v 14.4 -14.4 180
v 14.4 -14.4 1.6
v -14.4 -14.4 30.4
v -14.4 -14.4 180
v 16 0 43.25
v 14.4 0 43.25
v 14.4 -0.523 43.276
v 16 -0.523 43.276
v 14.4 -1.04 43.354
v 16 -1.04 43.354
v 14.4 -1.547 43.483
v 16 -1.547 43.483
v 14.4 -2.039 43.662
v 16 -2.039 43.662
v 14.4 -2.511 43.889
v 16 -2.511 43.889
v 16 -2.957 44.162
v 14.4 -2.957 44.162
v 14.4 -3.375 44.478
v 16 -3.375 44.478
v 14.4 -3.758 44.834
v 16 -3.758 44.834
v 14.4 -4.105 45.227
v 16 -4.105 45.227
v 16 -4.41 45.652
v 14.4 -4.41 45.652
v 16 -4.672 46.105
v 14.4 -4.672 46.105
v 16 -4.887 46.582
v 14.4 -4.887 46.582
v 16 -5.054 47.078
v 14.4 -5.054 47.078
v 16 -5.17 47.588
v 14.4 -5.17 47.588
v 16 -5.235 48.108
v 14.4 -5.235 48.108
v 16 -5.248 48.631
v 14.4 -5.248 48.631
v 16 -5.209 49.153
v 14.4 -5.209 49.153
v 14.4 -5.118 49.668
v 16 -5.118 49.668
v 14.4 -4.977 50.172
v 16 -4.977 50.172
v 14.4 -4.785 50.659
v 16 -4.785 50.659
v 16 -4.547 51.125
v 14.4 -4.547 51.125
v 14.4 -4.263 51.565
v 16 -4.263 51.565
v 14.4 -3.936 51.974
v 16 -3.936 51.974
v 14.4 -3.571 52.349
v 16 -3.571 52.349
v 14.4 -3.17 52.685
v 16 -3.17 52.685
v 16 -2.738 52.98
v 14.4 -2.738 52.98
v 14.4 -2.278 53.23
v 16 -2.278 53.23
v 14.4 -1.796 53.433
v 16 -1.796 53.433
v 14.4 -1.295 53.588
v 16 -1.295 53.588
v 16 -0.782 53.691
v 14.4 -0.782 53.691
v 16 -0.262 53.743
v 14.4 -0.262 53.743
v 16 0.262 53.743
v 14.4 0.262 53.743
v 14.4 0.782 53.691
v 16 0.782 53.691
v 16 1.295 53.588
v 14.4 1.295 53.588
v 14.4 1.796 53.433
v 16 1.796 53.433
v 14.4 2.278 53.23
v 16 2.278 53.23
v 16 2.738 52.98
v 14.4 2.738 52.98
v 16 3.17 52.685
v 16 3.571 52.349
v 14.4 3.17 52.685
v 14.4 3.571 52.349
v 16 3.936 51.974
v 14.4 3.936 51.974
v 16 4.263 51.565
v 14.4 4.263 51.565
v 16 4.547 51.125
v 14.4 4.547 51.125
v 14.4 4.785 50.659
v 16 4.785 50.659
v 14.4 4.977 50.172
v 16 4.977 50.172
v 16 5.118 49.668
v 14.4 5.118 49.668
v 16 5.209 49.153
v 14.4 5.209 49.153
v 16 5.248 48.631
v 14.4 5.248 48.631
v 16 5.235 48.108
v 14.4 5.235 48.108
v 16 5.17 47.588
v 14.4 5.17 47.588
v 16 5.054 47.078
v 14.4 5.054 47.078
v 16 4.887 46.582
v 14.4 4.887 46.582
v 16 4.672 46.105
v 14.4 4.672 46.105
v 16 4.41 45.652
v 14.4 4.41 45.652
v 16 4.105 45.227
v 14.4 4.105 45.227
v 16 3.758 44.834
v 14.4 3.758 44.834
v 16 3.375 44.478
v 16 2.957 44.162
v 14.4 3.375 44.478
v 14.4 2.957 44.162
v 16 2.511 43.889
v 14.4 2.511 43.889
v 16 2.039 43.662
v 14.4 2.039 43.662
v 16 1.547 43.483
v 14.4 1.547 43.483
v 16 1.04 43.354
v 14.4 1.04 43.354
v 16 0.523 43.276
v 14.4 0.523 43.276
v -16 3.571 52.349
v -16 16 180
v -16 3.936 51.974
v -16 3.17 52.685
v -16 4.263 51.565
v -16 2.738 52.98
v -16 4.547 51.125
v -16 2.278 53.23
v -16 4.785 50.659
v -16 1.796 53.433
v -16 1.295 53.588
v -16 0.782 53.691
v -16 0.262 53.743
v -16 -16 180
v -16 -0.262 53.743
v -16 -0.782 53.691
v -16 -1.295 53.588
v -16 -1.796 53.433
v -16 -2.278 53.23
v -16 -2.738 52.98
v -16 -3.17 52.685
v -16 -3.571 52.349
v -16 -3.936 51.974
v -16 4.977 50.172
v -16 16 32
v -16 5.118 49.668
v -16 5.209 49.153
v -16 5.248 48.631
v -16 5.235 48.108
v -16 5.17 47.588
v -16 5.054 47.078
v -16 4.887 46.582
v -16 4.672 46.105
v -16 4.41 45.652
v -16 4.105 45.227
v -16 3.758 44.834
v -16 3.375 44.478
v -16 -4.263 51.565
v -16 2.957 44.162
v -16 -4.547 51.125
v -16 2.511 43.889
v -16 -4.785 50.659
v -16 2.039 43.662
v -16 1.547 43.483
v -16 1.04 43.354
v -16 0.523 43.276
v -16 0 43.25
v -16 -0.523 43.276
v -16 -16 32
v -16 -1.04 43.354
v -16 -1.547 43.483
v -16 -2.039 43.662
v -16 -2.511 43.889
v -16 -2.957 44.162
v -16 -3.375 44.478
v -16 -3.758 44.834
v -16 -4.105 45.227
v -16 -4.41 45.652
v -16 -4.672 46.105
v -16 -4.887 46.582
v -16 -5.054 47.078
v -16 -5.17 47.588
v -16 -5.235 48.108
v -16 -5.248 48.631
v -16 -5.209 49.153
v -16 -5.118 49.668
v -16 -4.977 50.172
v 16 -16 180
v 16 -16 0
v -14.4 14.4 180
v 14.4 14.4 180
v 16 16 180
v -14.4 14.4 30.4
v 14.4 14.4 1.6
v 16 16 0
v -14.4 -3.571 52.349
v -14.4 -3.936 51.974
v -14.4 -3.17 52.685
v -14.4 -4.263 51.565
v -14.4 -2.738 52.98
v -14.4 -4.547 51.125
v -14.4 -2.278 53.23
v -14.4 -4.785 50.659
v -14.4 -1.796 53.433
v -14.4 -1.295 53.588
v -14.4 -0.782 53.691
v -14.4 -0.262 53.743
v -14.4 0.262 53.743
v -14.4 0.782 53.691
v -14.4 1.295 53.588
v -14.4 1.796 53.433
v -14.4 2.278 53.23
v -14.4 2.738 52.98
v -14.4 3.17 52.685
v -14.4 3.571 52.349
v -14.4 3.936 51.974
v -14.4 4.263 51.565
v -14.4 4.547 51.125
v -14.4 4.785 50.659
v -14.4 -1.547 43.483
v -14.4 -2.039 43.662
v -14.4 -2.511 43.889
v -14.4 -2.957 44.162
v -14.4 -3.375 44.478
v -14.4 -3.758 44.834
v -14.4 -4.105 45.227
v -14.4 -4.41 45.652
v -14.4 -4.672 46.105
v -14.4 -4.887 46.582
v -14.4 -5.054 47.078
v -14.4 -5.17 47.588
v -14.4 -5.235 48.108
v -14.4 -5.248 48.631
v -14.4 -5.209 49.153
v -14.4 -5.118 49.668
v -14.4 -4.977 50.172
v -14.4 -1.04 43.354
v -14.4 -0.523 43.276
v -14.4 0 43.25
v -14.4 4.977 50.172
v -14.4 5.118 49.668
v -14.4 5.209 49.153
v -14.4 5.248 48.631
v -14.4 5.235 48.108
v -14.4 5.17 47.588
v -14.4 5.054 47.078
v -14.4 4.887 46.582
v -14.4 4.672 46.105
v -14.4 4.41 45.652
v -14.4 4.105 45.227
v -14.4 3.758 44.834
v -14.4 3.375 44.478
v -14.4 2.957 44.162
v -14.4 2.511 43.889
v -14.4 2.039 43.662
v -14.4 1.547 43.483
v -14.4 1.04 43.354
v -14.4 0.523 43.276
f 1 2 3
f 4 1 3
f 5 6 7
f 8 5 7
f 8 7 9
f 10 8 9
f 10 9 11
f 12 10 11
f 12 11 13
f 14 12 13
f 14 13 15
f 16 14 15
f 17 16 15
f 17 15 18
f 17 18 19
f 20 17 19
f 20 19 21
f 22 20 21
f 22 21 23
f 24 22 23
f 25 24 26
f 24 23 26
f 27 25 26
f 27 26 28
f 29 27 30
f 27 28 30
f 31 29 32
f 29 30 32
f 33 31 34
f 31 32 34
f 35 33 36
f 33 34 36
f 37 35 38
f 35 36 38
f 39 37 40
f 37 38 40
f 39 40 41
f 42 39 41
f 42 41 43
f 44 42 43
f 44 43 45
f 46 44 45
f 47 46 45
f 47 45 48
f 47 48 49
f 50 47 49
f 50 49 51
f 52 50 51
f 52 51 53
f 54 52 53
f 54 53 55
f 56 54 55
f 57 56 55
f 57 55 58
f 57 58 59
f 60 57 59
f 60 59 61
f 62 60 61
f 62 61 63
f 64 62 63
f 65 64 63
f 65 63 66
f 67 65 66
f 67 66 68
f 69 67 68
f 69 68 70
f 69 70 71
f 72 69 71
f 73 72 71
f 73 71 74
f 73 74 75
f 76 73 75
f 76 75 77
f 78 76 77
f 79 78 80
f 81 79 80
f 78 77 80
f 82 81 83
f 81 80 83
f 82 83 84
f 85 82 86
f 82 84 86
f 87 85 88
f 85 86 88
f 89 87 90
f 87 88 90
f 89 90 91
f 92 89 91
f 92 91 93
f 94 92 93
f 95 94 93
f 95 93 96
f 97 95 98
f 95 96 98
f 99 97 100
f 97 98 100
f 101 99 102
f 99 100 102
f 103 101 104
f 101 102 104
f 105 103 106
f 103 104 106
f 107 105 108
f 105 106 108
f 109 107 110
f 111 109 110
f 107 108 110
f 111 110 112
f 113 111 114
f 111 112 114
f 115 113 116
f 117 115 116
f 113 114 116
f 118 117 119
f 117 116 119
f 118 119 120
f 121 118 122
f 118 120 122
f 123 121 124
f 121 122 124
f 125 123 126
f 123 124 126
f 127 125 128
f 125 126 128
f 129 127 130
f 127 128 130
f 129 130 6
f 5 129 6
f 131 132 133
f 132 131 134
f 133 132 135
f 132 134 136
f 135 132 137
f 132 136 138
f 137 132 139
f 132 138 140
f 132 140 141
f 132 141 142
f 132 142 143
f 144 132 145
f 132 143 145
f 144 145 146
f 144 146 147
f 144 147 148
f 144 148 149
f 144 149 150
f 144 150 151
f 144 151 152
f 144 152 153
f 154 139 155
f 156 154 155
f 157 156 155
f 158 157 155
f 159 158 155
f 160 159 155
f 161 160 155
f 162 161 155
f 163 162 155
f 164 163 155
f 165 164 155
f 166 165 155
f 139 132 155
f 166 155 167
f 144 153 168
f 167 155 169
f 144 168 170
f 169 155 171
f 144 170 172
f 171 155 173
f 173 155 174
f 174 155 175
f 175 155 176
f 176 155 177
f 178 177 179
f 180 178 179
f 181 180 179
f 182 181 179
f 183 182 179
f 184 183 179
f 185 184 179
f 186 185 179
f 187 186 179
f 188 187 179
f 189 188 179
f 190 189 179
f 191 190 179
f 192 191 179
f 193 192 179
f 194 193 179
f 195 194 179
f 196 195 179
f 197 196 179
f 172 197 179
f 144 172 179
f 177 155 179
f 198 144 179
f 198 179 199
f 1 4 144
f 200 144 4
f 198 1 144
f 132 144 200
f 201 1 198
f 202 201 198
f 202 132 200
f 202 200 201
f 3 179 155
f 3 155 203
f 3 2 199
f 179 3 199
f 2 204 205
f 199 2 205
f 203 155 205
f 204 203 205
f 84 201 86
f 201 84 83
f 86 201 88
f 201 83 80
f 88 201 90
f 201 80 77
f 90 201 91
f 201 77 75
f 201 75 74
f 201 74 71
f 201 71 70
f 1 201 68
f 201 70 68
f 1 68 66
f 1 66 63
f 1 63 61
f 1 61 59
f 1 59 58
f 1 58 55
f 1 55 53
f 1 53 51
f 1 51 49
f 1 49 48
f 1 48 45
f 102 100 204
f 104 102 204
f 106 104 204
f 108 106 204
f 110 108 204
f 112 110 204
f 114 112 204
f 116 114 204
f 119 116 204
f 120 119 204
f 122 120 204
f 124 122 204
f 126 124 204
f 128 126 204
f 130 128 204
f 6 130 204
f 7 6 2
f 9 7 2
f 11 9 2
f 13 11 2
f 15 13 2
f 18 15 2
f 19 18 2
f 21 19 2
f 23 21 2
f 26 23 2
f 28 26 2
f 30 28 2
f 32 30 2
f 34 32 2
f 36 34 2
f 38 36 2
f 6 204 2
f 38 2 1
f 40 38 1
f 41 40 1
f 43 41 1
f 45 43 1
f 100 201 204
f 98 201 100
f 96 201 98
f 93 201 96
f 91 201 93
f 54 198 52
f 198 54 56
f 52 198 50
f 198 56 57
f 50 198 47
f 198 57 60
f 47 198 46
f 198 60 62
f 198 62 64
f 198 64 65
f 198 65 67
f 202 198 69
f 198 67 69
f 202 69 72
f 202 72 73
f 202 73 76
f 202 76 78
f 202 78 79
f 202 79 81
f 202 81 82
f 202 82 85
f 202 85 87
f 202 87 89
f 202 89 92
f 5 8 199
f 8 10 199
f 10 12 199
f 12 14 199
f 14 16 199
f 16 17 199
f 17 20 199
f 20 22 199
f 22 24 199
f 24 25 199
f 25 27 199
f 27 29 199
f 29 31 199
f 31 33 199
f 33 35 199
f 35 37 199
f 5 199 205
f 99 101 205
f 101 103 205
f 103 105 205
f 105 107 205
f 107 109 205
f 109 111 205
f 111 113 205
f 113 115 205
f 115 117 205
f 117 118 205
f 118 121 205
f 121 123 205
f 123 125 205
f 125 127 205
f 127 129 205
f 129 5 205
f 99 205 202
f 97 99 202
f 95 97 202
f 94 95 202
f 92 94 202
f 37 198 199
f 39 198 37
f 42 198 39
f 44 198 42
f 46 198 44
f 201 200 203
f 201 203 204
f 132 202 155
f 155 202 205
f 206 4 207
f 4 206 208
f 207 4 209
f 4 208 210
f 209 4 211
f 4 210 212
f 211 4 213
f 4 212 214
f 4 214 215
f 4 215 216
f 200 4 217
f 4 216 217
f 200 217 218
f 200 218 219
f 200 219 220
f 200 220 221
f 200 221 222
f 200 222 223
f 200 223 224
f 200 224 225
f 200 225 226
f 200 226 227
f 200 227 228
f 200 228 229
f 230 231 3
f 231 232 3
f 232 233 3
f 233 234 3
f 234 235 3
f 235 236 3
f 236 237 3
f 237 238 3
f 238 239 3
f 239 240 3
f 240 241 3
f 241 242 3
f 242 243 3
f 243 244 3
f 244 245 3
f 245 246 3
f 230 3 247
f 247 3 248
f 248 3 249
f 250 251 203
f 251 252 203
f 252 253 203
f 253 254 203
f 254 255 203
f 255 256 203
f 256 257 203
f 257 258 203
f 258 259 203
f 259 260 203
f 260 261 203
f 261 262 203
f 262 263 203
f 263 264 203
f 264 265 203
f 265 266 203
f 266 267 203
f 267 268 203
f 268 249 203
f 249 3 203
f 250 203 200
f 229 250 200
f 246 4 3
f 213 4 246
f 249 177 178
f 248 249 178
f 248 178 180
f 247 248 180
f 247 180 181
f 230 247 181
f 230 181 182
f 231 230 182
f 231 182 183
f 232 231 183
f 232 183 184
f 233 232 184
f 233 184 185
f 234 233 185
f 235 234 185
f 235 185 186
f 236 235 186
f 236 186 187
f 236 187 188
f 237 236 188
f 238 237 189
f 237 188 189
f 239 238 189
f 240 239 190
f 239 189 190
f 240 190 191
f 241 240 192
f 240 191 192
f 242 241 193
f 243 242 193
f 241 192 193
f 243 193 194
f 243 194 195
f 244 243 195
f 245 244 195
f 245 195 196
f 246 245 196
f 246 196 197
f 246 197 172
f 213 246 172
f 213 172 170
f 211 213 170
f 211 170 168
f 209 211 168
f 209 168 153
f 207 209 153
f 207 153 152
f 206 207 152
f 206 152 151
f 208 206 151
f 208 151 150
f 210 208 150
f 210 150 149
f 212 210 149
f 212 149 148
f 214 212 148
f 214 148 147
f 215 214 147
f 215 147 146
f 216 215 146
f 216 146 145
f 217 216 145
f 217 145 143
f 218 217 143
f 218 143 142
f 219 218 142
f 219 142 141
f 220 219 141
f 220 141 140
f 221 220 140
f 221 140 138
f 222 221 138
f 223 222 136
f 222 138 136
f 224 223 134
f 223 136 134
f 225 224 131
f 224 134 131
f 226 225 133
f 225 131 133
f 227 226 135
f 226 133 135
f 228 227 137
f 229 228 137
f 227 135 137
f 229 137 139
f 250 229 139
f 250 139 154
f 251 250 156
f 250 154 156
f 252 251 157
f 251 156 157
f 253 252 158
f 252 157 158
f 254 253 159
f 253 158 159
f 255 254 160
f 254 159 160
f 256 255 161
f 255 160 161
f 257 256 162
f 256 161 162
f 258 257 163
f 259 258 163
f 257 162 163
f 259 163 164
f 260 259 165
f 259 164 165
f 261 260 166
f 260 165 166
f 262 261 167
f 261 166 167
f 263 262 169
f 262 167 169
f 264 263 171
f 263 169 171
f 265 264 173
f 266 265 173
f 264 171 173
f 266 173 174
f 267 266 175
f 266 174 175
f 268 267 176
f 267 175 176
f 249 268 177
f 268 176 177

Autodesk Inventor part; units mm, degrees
ref_plane "YZ Plane" through (0, 0, 0) normal (1, 0, 0) x (0, 1, 0)
ref_plane "XZ Plane" through (0, 0, 0) normal (0, 1, 0) x (-1, 0, 0)
ref_plane "XY Plane" through (0, 0, 0) normal (0, 0, 1) x (1, 0, 0)
sketch "スケッチ1" plane through (0, 0, 0) normal (0, 0, 1) x (1, 0, 0)
  line L0 (-16, -16) -> (16, -16)
  line L1 (16, -16) -> (16, 16)
  line L2 (16, 16) -> (-16, 16)
  line L3 (-16, 16) -> (-16, -16)
  line L4 (-16, -16) -> (16, 16) construction
  line L5 (16, -16) -> (-16, 16) construction
  line L6 (-14.4, 14.4) -> (14.4, 14.4)
  line L7 (14.4, 14.4) -> (14.4, -14.4)
  line L8 (14.4, -14.4) -> (-14.4, -14.4)
  line L9 (-14.4, -14.4) -> (-14.4, 14.4)
  point P0 (0, 0)
  dimension "d0" = 32
  dimension "d1" = 32
  dimension "d2" = 1.6
extrude "押し出し1" add sketch "スケッチ1" along normal blind 180
chamfer "面取り1" distance 32 angle 45 1 edges at (-16, 0, 0)
sketch "スケッチ2" plane through (16, -16, 180) normal (1, 0, 0) x (0, 0, -1)
  line L0 (0, 0) -> (0, 32) projected
  point P0 (180, 16)
  point P1 (131.5, 16)
  dimension "d8" = 131.5
hole "穴1" at (16, 0, 48.5) direction (-1, 0, 0) diameter 10.5 end through all
properties part number "PipeB"
